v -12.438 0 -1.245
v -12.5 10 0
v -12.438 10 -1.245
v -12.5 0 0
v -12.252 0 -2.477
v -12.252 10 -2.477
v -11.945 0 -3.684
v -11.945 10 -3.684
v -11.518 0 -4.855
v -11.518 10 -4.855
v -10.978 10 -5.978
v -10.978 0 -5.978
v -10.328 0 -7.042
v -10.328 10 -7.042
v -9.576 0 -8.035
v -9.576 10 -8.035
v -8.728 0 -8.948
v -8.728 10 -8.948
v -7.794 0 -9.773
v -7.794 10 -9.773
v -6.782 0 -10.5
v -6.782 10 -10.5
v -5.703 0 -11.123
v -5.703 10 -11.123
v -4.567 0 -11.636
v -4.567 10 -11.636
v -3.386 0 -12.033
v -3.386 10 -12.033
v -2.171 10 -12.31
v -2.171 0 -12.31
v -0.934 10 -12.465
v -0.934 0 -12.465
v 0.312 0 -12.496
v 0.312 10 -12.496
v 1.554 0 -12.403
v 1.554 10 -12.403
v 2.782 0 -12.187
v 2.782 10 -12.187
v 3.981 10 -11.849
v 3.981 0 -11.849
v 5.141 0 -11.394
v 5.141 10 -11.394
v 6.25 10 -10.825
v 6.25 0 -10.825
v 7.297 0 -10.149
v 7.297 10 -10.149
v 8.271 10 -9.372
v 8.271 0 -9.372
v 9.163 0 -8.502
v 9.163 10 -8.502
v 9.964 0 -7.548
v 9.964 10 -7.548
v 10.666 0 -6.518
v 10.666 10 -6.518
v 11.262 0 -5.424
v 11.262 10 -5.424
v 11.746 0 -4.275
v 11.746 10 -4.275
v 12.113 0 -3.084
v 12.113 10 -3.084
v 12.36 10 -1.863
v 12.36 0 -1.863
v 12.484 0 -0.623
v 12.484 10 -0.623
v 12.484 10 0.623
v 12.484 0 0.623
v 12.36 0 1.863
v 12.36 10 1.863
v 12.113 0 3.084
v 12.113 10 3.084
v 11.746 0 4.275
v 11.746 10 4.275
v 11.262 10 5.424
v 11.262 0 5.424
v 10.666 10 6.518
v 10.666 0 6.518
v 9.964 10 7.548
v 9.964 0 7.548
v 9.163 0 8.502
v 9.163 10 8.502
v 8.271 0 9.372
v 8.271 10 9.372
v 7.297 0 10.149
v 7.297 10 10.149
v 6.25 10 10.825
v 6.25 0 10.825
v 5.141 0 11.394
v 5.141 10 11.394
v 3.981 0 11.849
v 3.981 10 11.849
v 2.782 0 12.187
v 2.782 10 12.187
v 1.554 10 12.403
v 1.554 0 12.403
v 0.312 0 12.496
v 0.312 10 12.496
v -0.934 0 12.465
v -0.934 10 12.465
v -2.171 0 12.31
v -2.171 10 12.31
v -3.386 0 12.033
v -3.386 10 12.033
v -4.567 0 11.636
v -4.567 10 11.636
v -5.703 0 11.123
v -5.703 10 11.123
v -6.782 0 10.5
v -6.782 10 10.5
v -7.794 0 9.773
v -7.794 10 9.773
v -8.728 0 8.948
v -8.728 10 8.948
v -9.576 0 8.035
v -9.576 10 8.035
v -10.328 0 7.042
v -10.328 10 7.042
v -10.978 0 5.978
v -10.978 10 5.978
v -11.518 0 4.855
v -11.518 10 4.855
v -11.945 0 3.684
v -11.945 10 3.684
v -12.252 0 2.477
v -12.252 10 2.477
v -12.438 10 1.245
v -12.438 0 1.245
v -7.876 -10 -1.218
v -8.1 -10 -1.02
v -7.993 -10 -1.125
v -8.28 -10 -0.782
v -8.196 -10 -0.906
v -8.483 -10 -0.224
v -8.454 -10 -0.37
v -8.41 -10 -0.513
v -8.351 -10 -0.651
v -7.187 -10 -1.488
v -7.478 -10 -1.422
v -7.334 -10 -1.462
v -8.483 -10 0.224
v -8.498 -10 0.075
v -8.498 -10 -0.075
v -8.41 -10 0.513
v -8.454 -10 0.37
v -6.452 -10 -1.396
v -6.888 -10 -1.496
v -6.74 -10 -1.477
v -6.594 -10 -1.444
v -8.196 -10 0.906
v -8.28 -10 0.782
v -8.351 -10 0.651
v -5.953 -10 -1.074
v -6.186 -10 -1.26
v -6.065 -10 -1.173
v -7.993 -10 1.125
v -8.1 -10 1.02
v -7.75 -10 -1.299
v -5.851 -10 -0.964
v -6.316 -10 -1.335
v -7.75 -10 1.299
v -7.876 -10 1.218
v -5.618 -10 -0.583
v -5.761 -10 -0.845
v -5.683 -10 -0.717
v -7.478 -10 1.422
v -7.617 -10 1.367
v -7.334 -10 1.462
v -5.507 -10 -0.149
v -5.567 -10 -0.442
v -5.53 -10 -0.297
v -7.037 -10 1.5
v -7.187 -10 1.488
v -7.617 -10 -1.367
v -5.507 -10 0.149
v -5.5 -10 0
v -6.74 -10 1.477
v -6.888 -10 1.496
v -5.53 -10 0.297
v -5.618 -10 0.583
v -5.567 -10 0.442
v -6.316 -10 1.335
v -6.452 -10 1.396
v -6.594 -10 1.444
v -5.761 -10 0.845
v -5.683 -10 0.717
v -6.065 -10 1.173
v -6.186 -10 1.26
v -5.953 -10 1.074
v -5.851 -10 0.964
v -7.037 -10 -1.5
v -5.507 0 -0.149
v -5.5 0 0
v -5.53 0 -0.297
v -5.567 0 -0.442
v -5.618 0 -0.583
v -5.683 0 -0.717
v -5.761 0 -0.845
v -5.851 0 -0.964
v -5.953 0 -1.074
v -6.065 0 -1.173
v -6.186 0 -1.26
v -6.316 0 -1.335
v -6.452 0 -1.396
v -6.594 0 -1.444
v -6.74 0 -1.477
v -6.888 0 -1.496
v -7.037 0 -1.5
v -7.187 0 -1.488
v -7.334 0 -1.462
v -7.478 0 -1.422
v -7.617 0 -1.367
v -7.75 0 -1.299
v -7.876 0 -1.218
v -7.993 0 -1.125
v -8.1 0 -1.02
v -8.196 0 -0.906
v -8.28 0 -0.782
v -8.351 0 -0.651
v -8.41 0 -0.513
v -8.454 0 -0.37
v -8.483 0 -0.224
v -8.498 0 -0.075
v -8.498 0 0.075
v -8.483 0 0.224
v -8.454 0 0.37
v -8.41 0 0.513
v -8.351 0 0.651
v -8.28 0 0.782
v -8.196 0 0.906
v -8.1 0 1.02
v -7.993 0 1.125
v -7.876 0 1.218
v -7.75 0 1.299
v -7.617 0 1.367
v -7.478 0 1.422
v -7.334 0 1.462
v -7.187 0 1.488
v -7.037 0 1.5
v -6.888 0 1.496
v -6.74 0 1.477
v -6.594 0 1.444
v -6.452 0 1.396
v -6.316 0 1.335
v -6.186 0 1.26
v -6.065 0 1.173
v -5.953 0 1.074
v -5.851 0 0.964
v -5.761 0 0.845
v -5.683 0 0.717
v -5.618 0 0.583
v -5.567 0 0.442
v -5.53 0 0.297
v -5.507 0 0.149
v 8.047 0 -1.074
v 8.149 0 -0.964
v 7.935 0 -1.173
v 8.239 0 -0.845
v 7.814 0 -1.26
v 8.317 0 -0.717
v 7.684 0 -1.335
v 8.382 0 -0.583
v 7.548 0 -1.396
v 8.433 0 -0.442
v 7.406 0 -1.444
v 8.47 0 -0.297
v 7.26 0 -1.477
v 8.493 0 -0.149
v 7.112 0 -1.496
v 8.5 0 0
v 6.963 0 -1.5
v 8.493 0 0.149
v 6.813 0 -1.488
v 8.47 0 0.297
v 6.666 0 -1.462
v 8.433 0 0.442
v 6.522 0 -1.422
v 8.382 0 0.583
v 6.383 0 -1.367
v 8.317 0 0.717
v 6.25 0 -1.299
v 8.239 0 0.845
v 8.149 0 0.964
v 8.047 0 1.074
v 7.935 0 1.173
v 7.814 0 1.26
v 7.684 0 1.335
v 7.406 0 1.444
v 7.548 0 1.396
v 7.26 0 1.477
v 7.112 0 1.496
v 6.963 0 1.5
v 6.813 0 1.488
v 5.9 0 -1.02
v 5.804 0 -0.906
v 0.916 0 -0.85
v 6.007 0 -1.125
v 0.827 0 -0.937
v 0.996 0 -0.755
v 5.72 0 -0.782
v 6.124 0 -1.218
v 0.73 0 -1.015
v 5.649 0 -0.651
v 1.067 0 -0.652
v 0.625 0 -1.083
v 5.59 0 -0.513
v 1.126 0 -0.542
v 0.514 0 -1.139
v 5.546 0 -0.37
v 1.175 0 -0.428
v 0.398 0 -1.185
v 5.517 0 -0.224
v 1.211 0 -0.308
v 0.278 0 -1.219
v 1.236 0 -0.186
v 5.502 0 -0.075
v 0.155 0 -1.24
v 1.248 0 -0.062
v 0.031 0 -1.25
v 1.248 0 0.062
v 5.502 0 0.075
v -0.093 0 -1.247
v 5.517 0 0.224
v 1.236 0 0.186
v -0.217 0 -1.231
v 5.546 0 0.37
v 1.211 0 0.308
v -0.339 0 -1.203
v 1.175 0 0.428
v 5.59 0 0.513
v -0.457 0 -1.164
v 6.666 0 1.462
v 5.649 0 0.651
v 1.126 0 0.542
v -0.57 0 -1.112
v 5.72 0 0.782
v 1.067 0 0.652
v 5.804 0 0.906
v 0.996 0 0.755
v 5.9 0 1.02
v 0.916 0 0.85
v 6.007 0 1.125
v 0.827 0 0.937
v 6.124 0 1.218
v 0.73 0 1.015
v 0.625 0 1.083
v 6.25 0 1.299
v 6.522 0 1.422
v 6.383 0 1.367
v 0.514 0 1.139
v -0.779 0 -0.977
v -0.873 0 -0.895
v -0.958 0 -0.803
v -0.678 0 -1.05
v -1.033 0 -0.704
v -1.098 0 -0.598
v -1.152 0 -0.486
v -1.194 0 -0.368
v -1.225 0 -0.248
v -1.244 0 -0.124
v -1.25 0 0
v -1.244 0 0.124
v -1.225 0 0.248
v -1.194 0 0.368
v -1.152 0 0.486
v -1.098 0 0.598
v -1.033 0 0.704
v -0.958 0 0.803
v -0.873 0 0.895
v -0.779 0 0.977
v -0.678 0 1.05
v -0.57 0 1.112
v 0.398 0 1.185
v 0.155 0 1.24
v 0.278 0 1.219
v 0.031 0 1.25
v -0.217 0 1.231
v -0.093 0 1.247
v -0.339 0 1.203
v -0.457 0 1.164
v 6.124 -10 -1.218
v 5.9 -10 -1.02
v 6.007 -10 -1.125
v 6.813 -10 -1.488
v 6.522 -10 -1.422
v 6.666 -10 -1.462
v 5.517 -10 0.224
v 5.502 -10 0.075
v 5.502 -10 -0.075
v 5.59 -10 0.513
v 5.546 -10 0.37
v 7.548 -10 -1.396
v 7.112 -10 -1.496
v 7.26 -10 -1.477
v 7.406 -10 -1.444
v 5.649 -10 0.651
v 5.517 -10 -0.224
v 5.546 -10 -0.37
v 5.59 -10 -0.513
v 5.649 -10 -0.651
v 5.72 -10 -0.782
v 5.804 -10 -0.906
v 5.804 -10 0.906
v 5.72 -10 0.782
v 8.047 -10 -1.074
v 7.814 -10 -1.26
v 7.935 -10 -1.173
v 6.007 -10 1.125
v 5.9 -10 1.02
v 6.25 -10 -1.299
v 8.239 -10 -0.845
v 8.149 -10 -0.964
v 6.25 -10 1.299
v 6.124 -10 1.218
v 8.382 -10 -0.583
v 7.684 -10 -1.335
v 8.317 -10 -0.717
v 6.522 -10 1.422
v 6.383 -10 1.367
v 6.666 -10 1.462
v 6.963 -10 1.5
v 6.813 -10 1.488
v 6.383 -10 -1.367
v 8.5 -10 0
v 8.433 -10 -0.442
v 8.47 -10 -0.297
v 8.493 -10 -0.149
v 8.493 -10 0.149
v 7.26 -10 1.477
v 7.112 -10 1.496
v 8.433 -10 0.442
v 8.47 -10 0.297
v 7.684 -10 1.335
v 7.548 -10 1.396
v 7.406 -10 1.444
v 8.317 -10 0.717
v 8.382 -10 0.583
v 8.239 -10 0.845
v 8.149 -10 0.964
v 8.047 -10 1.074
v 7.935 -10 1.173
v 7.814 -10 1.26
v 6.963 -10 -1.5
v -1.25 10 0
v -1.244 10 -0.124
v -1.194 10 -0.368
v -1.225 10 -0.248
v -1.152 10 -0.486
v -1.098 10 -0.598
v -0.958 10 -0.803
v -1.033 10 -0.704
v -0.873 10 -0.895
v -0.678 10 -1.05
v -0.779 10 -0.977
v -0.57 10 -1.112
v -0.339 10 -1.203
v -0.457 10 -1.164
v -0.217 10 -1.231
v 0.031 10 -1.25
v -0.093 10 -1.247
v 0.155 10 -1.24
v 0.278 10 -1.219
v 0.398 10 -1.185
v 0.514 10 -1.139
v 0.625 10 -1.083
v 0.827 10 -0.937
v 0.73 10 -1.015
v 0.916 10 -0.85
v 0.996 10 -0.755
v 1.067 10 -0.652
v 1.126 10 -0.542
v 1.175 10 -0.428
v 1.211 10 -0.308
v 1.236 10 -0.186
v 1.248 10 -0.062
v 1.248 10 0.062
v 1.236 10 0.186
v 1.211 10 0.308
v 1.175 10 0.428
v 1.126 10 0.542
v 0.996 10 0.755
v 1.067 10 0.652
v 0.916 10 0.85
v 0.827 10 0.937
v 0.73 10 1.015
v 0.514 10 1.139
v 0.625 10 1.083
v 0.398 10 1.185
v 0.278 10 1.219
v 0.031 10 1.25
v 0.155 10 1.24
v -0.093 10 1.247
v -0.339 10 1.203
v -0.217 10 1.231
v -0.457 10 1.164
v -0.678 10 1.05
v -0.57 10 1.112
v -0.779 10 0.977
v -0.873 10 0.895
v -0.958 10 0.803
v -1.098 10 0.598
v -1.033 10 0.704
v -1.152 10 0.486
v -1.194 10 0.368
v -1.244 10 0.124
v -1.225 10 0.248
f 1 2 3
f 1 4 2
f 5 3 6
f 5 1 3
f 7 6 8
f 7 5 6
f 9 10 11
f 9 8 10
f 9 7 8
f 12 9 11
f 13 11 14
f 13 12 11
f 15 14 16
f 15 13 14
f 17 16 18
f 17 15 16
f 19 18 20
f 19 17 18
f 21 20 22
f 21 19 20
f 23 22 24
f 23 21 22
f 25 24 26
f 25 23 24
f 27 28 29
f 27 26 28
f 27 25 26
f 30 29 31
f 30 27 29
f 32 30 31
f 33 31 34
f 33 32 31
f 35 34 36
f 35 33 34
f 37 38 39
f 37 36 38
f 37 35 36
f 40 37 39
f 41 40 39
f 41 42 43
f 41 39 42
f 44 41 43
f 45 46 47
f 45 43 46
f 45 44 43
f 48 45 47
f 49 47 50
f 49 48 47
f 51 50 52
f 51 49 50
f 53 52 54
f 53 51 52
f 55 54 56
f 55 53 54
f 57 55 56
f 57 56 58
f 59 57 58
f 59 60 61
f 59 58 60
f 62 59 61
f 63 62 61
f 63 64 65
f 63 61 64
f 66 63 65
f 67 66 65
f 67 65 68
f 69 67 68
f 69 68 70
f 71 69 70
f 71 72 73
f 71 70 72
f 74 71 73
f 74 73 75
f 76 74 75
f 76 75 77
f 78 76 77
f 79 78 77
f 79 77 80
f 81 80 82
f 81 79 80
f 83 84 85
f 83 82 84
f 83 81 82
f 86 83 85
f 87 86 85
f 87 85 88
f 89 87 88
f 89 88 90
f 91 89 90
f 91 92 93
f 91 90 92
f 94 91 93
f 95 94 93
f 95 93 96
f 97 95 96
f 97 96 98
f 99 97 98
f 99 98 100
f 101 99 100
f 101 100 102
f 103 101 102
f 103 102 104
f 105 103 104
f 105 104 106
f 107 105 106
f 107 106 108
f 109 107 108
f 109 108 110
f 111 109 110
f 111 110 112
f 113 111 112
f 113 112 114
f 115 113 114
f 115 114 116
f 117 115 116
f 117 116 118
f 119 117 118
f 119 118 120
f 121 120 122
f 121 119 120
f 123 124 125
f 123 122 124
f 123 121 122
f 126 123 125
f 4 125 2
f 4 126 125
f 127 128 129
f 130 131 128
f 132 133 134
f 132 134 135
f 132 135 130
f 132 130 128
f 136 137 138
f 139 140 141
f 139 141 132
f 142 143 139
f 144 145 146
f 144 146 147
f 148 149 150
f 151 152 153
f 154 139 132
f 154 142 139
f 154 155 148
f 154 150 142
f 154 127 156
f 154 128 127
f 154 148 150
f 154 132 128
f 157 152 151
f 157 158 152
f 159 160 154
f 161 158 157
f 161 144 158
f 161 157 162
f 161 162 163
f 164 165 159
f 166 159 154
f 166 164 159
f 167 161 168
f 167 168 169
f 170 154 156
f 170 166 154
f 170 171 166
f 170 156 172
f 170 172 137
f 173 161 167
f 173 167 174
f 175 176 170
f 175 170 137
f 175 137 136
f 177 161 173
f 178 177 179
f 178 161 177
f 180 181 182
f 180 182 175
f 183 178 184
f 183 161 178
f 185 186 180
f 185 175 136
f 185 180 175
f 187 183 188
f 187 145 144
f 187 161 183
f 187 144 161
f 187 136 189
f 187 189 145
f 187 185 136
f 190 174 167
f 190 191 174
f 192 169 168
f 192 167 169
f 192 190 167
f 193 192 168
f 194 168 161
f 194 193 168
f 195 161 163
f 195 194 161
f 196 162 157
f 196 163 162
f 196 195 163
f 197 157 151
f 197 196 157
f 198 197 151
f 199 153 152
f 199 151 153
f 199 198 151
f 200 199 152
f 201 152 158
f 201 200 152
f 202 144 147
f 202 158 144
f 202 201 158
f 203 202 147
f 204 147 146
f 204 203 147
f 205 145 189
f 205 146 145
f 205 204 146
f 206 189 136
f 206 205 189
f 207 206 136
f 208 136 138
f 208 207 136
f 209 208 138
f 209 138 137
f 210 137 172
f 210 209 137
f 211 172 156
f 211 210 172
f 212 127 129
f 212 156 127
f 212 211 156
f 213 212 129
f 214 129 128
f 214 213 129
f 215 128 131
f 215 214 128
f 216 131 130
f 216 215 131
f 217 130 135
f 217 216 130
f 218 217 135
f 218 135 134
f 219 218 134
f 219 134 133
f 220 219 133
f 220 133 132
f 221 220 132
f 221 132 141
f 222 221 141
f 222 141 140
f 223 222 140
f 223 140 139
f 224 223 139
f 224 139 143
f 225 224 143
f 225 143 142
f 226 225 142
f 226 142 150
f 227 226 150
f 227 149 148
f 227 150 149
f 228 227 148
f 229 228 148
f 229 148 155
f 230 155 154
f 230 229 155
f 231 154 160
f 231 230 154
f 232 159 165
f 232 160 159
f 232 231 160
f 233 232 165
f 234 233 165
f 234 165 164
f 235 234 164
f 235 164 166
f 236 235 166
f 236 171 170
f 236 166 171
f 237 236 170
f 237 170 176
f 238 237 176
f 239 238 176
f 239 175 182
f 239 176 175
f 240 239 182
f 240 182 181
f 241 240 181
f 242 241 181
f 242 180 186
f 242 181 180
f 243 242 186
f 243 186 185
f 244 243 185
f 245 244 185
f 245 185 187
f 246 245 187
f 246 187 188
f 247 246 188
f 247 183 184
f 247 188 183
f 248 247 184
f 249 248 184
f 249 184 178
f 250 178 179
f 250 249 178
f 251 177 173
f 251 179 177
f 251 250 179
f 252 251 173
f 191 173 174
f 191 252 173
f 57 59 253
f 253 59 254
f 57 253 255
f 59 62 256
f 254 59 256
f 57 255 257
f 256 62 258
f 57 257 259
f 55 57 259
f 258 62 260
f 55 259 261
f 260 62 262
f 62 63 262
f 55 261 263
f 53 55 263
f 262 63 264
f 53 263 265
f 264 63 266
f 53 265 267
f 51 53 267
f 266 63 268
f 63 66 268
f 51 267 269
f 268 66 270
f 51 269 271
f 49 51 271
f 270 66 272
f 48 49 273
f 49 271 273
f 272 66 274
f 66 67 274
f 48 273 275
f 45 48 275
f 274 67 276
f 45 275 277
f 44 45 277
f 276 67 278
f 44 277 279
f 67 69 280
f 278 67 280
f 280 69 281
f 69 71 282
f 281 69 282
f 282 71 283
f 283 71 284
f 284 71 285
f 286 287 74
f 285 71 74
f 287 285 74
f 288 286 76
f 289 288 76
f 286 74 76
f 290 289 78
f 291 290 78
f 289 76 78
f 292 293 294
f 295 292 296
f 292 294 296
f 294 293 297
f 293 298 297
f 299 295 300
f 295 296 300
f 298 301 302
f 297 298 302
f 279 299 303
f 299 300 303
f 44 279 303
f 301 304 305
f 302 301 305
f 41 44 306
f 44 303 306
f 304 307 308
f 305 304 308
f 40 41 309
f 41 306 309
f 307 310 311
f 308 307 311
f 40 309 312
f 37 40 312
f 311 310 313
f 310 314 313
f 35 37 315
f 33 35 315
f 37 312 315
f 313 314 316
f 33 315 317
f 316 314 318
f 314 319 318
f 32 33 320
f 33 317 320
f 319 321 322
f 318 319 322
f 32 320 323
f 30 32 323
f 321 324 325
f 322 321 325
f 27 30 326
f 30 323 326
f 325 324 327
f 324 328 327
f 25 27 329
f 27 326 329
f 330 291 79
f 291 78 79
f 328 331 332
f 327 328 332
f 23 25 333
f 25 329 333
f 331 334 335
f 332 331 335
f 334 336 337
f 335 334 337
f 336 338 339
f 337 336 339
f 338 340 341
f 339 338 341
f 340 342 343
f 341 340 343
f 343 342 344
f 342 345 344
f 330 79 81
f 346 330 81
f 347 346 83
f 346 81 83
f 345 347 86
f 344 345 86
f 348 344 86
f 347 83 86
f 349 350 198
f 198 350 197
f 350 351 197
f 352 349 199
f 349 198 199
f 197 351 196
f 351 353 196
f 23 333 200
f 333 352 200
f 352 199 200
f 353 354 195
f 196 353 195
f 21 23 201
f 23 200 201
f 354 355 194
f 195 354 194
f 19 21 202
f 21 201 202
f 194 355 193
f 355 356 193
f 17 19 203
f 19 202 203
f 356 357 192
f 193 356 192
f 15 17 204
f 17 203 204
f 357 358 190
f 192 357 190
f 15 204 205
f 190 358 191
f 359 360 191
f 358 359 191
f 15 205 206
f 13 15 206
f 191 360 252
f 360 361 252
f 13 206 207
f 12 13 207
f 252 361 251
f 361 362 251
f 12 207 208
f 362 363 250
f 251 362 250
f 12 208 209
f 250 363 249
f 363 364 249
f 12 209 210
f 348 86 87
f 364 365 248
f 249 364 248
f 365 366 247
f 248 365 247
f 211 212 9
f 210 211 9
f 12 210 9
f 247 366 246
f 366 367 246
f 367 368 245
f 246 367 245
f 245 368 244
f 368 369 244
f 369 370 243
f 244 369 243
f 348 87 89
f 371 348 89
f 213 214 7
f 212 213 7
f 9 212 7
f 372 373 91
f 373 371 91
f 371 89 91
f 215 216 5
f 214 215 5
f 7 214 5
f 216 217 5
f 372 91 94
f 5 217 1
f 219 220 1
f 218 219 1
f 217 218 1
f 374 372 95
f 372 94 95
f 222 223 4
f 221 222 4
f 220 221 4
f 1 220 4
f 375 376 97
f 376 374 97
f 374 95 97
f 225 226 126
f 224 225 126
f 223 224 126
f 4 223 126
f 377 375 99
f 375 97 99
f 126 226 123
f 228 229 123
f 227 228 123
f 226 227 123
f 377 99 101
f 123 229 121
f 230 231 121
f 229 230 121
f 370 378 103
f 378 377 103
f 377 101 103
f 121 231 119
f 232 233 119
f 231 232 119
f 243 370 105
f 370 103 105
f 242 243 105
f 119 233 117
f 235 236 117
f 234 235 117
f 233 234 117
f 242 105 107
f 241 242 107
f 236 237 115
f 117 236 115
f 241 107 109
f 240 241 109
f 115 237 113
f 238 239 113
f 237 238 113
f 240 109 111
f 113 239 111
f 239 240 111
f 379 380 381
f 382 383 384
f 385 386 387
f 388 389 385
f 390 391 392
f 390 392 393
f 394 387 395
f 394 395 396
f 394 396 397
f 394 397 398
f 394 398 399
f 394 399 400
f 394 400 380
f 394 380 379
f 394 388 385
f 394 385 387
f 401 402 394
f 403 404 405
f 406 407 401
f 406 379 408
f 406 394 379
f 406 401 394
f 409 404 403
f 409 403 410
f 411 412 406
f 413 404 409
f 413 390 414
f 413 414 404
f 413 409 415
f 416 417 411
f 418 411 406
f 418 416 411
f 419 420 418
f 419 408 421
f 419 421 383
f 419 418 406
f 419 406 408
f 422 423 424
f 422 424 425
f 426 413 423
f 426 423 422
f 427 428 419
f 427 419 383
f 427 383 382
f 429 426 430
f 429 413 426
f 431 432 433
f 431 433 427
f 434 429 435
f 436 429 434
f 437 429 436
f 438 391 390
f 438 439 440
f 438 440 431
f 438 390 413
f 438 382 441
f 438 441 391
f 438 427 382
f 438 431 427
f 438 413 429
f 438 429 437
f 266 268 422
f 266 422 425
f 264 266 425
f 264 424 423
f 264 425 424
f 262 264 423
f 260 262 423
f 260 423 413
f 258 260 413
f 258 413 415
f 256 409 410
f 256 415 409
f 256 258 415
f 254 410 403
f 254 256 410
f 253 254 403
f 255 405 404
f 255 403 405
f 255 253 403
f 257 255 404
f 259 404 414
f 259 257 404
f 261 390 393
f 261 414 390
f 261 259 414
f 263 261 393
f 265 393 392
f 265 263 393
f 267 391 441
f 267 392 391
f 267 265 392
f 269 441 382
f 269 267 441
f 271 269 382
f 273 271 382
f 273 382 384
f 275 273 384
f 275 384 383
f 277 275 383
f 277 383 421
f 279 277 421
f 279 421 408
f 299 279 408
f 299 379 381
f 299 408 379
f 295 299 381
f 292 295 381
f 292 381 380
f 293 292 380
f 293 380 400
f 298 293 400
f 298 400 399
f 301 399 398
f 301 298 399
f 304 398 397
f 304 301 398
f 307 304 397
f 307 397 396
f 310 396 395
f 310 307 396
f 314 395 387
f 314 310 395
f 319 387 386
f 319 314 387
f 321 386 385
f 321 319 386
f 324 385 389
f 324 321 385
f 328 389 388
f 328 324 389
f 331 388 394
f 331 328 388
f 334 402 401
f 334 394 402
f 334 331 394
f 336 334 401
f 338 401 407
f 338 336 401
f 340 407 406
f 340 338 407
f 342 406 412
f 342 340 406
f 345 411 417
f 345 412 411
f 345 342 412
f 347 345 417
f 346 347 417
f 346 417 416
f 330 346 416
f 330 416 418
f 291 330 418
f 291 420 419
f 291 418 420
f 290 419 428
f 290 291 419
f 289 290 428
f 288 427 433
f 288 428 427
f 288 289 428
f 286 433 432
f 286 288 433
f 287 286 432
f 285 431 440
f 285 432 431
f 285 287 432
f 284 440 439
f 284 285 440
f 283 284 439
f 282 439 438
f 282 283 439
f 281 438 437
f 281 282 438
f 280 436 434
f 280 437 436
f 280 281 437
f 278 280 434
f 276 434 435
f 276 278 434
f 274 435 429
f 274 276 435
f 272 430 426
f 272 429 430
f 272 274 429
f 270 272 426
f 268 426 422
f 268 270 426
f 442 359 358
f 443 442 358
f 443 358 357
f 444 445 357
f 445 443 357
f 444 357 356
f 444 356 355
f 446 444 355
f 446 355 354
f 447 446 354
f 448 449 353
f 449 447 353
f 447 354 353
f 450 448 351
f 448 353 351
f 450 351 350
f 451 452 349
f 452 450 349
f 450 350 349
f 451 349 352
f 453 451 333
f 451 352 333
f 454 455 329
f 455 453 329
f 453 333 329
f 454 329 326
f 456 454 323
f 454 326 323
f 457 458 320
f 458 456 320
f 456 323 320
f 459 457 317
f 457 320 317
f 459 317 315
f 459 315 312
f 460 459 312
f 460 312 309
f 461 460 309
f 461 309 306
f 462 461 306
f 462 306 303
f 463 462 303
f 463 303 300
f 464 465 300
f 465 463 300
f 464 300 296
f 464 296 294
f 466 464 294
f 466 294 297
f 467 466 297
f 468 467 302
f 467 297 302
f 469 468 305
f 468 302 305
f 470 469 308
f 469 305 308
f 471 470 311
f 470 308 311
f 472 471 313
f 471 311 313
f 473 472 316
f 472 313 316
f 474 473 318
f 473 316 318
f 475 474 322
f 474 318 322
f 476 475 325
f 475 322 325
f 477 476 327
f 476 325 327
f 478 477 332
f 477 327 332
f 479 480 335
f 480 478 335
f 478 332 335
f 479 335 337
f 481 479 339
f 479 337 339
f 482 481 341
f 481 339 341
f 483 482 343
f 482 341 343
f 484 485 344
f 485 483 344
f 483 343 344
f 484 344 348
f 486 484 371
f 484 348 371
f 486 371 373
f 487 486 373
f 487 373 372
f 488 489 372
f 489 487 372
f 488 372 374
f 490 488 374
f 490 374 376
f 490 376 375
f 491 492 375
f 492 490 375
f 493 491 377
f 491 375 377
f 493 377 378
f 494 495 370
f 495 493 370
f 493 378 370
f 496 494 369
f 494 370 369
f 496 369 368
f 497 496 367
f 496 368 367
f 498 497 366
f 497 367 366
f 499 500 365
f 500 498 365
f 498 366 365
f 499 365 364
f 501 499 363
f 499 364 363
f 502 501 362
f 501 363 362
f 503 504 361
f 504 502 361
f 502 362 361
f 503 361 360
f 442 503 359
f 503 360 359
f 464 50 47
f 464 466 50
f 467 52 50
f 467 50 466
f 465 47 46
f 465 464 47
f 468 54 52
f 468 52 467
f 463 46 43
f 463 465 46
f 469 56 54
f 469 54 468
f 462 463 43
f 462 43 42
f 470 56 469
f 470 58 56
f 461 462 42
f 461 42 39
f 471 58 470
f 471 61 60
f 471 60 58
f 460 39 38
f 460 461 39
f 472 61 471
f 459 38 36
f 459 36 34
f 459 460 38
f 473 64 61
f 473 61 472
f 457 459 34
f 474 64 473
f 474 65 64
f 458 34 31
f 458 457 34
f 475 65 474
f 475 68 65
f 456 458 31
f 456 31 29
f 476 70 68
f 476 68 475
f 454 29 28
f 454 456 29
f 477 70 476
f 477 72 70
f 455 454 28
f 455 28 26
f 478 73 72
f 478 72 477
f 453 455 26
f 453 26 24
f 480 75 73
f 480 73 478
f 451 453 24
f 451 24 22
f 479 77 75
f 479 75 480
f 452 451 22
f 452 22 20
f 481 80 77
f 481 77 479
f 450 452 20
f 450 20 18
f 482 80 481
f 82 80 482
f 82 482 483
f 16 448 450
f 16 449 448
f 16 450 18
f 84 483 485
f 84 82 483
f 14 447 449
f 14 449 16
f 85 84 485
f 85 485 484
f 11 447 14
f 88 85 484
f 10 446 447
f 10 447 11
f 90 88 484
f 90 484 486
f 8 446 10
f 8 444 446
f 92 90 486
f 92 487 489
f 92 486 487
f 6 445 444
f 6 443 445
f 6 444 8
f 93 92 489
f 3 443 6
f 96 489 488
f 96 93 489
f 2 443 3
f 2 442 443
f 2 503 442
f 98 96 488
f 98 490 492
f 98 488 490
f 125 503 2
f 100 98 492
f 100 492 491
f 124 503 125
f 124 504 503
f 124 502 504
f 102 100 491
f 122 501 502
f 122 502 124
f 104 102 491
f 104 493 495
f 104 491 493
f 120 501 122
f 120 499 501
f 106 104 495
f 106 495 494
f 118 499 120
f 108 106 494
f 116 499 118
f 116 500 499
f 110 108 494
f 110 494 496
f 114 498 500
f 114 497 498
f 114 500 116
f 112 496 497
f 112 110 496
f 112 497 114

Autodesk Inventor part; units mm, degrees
ref_plane "YZ Plane" through (0, 0, 0) normal (1, 0, 0) x (0, 1, 0)
ref_plane "XZ Plane" through (0, 0, 0) normal (0, 1, 0) x (-1, 0, 0)
ref_plane "XY Plane" through (0, 0, 0) normal (0, 0, 1) x (1, 0, 0)
sketch "Sketch1" plane through (0, 0, 0) normal (0, 1, 0) x (-1, 0, 0)
  circle A0 centre (0, 0) radius 12.5
  circle A1 centre (0, 0) radius 1.25
  dimension "d0" = 25
  dimension "d1" = 2.5
extrude "Extrusion1" add sketch "Sketch1" along normal blind 10
sketch "Sketch2" plane through (0, 0, 0) normal (0, -1, 0) x (1, 0, 0)
  circle A0 centre (-7, 0) radius 1.5
  circle A1 centre (7, 0) radius 1.5
  point P0 (0, 0)
  dimension "d4" = 3
  dimension "d5" = 3
  dimension "d6" = 7
  dimension "d7" = 7
extrude "Extrusion2" add sketch "Sketch2" along normal blind 10
properties part number "buzz"
